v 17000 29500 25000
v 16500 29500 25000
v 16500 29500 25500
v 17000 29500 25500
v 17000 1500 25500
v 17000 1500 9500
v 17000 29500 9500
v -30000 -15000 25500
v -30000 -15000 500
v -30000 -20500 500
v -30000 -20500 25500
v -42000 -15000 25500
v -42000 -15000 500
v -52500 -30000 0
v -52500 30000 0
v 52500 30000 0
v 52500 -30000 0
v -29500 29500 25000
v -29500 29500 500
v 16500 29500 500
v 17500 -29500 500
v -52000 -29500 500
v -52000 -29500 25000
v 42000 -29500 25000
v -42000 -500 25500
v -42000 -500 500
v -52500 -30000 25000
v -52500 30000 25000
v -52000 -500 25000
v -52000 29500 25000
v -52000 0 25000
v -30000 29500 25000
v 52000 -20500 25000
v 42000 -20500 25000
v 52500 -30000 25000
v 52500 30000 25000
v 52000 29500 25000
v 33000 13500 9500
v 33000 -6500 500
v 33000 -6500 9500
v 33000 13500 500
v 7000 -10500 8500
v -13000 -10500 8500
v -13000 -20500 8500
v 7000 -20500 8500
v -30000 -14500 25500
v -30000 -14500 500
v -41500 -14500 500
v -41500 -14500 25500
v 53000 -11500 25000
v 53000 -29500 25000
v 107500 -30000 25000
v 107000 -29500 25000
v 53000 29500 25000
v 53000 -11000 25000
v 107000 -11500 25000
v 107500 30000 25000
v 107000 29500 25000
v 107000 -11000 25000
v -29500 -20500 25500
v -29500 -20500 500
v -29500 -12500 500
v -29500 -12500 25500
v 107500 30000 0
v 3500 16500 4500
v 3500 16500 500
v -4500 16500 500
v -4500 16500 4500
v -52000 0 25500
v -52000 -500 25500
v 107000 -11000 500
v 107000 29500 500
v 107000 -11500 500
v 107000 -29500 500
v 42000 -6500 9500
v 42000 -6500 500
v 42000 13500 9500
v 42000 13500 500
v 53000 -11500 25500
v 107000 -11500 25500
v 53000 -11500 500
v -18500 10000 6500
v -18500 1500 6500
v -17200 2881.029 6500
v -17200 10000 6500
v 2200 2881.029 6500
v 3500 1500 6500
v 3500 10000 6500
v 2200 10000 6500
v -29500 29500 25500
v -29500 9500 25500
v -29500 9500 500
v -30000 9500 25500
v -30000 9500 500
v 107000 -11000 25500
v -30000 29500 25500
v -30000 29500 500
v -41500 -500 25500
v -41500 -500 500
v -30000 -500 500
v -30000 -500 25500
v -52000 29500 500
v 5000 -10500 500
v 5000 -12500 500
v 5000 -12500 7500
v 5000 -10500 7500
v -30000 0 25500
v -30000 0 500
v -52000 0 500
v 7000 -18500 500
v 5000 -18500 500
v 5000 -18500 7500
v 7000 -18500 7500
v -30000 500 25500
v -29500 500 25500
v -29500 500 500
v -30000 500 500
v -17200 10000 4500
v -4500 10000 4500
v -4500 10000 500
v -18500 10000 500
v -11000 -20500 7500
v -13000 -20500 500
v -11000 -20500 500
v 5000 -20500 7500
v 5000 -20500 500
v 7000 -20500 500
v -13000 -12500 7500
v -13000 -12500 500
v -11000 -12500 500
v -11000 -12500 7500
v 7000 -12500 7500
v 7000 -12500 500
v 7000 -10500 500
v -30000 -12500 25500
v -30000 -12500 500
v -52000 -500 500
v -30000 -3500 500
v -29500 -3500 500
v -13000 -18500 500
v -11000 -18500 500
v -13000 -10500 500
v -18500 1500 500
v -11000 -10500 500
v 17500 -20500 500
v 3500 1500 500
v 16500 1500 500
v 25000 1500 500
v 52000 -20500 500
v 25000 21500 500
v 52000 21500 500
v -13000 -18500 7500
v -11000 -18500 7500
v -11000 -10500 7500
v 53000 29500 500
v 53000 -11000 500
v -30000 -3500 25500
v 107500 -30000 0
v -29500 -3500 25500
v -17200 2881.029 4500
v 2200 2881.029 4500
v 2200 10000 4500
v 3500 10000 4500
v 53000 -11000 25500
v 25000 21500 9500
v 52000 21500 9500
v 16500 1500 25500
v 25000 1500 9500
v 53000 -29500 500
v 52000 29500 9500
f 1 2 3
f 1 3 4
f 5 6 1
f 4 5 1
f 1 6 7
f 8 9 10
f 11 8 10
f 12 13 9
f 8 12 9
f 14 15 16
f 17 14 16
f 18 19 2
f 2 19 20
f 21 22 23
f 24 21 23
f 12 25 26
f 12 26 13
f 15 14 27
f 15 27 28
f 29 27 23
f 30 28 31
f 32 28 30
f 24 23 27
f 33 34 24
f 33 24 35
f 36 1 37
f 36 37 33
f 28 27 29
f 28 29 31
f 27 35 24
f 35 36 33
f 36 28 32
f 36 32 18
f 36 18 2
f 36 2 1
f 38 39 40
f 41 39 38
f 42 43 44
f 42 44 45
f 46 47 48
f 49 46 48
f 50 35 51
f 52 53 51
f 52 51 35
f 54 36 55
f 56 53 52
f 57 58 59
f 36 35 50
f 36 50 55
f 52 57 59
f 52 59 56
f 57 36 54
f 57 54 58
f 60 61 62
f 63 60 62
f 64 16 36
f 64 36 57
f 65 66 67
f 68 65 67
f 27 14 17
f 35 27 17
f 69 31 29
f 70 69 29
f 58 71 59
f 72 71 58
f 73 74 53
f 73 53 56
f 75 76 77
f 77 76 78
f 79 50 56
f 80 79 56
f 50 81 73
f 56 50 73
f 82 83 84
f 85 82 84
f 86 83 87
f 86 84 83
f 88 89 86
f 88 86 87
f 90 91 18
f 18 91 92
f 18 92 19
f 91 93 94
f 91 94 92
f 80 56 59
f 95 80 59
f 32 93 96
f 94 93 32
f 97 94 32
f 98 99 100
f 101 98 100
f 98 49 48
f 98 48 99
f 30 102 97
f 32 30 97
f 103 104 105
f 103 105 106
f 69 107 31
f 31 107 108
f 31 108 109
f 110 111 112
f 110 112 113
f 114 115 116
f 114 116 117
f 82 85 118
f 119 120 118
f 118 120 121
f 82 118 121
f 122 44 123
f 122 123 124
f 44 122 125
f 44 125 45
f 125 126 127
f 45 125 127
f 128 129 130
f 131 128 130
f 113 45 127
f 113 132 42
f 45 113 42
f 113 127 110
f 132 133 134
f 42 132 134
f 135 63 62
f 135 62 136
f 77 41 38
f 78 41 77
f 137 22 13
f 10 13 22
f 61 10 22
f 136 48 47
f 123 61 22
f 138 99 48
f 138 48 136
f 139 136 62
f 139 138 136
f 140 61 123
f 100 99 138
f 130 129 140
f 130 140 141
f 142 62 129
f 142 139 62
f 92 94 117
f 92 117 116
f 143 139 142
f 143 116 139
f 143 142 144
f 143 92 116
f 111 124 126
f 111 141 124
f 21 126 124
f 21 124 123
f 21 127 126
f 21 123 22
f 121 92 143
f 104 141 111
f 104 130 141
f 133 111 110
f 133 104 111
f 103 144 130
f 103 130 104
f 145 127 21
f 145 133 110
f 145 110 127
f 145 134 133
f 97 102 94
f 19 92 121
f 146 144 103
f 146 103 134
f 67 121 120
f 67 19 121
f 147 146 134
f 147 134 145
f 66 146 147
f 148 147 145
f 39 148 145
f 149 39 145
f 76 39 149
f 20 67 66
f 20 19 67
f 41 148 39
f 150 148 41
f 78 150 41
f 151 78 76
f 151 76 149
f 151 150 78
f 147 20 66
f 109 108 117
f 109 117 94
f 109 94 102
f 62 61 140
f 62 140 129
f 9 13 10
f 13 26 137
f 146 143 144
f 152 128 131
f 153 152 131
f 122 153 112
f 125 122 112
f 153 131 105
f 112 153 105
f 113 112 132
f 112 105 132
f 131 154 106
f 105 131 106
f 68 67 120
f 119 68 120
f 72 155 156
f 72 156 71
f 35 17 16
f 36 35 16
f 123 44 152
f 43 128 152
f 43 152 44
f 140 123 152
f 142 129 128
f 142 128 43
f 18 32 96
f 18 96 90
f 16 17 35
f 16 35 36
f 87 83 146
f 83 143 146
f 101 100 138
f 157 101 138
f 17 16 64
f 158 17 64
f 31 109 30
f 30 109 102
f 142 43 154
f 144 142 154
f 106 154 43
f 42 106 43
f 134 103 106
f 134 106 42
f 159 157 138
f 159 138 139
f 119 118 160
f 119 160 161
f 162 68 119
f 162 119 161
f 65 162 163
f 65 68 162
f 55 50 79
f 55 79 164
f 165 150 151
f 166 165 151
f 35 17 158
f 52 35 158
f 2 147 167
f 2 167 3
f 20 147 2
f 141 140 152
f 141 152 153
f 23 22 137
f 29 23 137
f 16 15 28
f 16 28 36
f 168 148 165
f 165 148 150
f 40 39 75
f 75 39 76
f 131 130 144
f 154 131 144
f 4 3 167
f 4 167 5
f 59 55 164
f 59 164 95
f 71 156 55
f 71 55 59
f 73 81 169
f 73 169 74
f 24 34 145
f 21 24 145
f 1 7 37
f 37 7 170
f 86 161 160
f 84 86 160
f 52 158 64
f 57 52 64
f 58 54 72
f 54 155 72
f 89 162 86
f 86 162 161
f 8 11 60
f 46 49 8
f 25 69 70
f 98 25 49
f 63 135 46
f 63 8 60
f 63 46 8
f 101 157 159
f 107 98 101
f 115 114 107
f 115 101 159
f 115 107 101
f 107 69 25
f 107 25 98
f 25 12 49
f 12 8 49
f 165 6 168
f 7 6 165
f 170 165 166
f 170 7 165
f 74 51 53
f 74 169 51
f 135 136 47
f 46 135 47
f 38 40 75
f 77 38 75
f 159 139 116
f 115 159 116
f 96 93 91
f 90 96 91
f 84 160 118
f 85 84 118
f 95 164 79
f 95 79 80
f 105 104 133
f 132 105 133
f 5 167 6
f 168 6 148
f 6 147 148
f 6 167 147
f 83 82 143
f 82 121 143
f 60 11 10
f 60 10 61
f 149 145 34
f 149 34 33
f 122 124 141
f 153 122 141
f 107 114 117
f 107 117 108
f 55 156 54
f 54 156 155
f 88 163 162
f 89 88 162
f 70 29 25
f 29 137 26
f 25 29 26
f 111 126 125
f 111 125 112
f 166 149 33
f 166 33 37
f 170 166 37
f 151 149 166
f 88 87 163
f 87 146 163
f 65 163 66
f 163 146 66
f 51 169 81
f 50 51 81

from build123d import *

# Parameters (mm, degrees)
F0_W         = 105000
F0_H         = 60000
F1_DEPTH     = 25000
F2_T         = -500
F3_W         = 500
F3_H         = 20000
F3_H_2       = 28000
F4_DEPTH     = 25000
F5_W         = 9000
F5_H         = 20000
F6_DEPTH     = 9000
F7_W         = 2000
F7_H         = 2000
F8_DEPTH     = 7000
F9_W         = 20000
F9_H         = 10000
F10_DEPTH    = 1000
F12_DEPTH    = 4000
F14_DEPTH    = 2000
F15_W        = 35000
F15_H        = 9000
F16_DEPTH    = 24500
F17_T4_DEPTH = 73292.0746991478
F18_W        = 55000
F18_H        = 60000
F19_DEPTH    = 25000
F20_T        = -500
F21_W        = 54000
F21_H        = 500
F22_DEPTH    = 25000


# Not quite as in the source:
# - a fillet or chamfer that OpenCascade refuses, or shapes differently, is made with other operations: its cross-section is extruded or revolved along the edge and cut away or added


with BuildPart() as f1:
    # F0 (on Top) → F1 (new body)
    with BuildSketch(Plane.XY):
        Rectangle(F0_W, F0_H)
    extrude(amount=F1_DEPTH)

    # F2
    f2_openings = [f1.faces().sort_by_distance(p)[0] for p in [
        (0, 0, 25000),
    ]]
    offset(amount=F2_T, openings=f2_openings)

    # F3 (on face) → F4 (join)
    with BuildSketch(Plane.XY.offset(500)):
        with Locations((-29750, 19500)):
            Rectangle(F3_W, F3_H)
        Polygon((-29500, -3500), (-29500, 500), (-30000, 500), (-30000, 0), (-52000, 0), (-52000, -500), (-42000, -500), (-42000, -15000), (-30000, -15000), (-30000, -20500), (-29500, -20500), (-29500, -12500), (-30000, -12500), (-30000, -14500), (-41500, -14500), (-41500, -500), (-30000, -500), (-30000, -3500), align=None)
        with Locations((16750, 15500)):
            Rectangle(F3_W, F3_H_2)
    extrude(amount=F4_DEPTH)

    # F5 (on face) → F6 (join)
    with BuildSketch(Plane.XY.offset(500)):
        Polygon((17000, 29500), (17000, 1500), (25000, 1500), (25000, 21500), (52000, 21500), (52000, 29500), align=None)
        with Locations((37500, 3500)):
            Rectangle(F5_W, F5_H)
    extrude(amount=F6_DEPTH)

    # F7 (on face) → F8 (join)
    with BuildSketch(Plane.XY.offset(500)):
        with Locations((-12000, -19500)):
            Rectangle(F7_W, F7_H)
        with Locations((-12000, -11500)):
            Rectangle(F7_W, F7_H)
        with Locations((6000, -11500)):
            Rectangle(F7_W, F7_H)
        with Locations((6000, -19500)):
            Rectangle(F7_W, F7_H)
    extrude(amount=F8_DEPTH)

    # F9 (on face) → F10 (join)
    with BuildSketch(Plane.XY.offset(7500)):
        with Locations((-3000, -15500)):
            Rectangle(F9_W, F9_H)
    extrude(amount=F10_DEPTH)

    # F11 (on face) → F12 (join)
    with BuildSketch(Plane.XY.offset(500)):
        Polygon((-4500, 10000), (-18500, 10000), (-18500, 1500), (3500, 1500), (3500, 16500), (-4500, 16500), align=None)
    extrude(amount=F12_DEPTH)

    # F13 (on face) → F14 (join)
    with BuildSketch(Plane.XY.offset(4500)):
        Polygon((-17200, 10000), (-18500, 10000), (-18500, 1500), (3500, 1500), (3500, 10000), (2200, 10000), (2200, 2881.0291290283), (-17200, 2881.0291290283), align=None)
    extrude(amount=F14_DEPTH)

    # F15 (on face) → F16 (join)
    with BuildSketch(Plane.XY.offset(500)):
        with Locations((34500, -25000)):
            Rectangle(F15_W, F15_H)
    extrude(amount=F16_DEPTH)

    # F17: chamfer of 25000 on 1 edges, made by hand


with BuildPart() as f17_tool2:
    # F17_s3 → F17_t4 (new body)
    with BuildSketch(Plane.XZ.offset(-43792.0746991478)):
        Polygon((42000, 25000), (17000, 0), (17000, 25000), align=None)
    extrude(amount=F17_T4_DEPTH)

    split(bisect_by=Plane.XY.offset(500), keep=Keep.TOP)

    split(bisect_by=Plane.XZ.offset(-1500), keep=Keep.TOP)


with BuildPart() as f1_1:
    add(f1.part)

    # F17_t1: cut F17_tool2
    add(f17_tool2.part, mode=Mode.SUBTRACT)


with BuildPart() as f19:
    # F18 (on Top) → F19 (new body)
    with BuildSketch(Plane.XY):
        with Locations((80000, 0)):
            Rectangle(F18_W, F18_H)
    extrude(amount=F19_DEPTH)

    # F20
    f20_openings = [f19.faces().sort_by_distance(p)[0] for p in [
        (80000, 0, 25000),
    ]]
    offset(amount=F20_T, openings=f20_openings)

    # F21 (on face) → F22 (join)
    with BuildSketch(Plane.XY.offset(500)):
        with Locations((80000, -11250)):
            Rectangle(F21_W, F21_H)
    extrude(amount=F22_DEPTH)


solid = Compound([f1_1.part, f19.part])
